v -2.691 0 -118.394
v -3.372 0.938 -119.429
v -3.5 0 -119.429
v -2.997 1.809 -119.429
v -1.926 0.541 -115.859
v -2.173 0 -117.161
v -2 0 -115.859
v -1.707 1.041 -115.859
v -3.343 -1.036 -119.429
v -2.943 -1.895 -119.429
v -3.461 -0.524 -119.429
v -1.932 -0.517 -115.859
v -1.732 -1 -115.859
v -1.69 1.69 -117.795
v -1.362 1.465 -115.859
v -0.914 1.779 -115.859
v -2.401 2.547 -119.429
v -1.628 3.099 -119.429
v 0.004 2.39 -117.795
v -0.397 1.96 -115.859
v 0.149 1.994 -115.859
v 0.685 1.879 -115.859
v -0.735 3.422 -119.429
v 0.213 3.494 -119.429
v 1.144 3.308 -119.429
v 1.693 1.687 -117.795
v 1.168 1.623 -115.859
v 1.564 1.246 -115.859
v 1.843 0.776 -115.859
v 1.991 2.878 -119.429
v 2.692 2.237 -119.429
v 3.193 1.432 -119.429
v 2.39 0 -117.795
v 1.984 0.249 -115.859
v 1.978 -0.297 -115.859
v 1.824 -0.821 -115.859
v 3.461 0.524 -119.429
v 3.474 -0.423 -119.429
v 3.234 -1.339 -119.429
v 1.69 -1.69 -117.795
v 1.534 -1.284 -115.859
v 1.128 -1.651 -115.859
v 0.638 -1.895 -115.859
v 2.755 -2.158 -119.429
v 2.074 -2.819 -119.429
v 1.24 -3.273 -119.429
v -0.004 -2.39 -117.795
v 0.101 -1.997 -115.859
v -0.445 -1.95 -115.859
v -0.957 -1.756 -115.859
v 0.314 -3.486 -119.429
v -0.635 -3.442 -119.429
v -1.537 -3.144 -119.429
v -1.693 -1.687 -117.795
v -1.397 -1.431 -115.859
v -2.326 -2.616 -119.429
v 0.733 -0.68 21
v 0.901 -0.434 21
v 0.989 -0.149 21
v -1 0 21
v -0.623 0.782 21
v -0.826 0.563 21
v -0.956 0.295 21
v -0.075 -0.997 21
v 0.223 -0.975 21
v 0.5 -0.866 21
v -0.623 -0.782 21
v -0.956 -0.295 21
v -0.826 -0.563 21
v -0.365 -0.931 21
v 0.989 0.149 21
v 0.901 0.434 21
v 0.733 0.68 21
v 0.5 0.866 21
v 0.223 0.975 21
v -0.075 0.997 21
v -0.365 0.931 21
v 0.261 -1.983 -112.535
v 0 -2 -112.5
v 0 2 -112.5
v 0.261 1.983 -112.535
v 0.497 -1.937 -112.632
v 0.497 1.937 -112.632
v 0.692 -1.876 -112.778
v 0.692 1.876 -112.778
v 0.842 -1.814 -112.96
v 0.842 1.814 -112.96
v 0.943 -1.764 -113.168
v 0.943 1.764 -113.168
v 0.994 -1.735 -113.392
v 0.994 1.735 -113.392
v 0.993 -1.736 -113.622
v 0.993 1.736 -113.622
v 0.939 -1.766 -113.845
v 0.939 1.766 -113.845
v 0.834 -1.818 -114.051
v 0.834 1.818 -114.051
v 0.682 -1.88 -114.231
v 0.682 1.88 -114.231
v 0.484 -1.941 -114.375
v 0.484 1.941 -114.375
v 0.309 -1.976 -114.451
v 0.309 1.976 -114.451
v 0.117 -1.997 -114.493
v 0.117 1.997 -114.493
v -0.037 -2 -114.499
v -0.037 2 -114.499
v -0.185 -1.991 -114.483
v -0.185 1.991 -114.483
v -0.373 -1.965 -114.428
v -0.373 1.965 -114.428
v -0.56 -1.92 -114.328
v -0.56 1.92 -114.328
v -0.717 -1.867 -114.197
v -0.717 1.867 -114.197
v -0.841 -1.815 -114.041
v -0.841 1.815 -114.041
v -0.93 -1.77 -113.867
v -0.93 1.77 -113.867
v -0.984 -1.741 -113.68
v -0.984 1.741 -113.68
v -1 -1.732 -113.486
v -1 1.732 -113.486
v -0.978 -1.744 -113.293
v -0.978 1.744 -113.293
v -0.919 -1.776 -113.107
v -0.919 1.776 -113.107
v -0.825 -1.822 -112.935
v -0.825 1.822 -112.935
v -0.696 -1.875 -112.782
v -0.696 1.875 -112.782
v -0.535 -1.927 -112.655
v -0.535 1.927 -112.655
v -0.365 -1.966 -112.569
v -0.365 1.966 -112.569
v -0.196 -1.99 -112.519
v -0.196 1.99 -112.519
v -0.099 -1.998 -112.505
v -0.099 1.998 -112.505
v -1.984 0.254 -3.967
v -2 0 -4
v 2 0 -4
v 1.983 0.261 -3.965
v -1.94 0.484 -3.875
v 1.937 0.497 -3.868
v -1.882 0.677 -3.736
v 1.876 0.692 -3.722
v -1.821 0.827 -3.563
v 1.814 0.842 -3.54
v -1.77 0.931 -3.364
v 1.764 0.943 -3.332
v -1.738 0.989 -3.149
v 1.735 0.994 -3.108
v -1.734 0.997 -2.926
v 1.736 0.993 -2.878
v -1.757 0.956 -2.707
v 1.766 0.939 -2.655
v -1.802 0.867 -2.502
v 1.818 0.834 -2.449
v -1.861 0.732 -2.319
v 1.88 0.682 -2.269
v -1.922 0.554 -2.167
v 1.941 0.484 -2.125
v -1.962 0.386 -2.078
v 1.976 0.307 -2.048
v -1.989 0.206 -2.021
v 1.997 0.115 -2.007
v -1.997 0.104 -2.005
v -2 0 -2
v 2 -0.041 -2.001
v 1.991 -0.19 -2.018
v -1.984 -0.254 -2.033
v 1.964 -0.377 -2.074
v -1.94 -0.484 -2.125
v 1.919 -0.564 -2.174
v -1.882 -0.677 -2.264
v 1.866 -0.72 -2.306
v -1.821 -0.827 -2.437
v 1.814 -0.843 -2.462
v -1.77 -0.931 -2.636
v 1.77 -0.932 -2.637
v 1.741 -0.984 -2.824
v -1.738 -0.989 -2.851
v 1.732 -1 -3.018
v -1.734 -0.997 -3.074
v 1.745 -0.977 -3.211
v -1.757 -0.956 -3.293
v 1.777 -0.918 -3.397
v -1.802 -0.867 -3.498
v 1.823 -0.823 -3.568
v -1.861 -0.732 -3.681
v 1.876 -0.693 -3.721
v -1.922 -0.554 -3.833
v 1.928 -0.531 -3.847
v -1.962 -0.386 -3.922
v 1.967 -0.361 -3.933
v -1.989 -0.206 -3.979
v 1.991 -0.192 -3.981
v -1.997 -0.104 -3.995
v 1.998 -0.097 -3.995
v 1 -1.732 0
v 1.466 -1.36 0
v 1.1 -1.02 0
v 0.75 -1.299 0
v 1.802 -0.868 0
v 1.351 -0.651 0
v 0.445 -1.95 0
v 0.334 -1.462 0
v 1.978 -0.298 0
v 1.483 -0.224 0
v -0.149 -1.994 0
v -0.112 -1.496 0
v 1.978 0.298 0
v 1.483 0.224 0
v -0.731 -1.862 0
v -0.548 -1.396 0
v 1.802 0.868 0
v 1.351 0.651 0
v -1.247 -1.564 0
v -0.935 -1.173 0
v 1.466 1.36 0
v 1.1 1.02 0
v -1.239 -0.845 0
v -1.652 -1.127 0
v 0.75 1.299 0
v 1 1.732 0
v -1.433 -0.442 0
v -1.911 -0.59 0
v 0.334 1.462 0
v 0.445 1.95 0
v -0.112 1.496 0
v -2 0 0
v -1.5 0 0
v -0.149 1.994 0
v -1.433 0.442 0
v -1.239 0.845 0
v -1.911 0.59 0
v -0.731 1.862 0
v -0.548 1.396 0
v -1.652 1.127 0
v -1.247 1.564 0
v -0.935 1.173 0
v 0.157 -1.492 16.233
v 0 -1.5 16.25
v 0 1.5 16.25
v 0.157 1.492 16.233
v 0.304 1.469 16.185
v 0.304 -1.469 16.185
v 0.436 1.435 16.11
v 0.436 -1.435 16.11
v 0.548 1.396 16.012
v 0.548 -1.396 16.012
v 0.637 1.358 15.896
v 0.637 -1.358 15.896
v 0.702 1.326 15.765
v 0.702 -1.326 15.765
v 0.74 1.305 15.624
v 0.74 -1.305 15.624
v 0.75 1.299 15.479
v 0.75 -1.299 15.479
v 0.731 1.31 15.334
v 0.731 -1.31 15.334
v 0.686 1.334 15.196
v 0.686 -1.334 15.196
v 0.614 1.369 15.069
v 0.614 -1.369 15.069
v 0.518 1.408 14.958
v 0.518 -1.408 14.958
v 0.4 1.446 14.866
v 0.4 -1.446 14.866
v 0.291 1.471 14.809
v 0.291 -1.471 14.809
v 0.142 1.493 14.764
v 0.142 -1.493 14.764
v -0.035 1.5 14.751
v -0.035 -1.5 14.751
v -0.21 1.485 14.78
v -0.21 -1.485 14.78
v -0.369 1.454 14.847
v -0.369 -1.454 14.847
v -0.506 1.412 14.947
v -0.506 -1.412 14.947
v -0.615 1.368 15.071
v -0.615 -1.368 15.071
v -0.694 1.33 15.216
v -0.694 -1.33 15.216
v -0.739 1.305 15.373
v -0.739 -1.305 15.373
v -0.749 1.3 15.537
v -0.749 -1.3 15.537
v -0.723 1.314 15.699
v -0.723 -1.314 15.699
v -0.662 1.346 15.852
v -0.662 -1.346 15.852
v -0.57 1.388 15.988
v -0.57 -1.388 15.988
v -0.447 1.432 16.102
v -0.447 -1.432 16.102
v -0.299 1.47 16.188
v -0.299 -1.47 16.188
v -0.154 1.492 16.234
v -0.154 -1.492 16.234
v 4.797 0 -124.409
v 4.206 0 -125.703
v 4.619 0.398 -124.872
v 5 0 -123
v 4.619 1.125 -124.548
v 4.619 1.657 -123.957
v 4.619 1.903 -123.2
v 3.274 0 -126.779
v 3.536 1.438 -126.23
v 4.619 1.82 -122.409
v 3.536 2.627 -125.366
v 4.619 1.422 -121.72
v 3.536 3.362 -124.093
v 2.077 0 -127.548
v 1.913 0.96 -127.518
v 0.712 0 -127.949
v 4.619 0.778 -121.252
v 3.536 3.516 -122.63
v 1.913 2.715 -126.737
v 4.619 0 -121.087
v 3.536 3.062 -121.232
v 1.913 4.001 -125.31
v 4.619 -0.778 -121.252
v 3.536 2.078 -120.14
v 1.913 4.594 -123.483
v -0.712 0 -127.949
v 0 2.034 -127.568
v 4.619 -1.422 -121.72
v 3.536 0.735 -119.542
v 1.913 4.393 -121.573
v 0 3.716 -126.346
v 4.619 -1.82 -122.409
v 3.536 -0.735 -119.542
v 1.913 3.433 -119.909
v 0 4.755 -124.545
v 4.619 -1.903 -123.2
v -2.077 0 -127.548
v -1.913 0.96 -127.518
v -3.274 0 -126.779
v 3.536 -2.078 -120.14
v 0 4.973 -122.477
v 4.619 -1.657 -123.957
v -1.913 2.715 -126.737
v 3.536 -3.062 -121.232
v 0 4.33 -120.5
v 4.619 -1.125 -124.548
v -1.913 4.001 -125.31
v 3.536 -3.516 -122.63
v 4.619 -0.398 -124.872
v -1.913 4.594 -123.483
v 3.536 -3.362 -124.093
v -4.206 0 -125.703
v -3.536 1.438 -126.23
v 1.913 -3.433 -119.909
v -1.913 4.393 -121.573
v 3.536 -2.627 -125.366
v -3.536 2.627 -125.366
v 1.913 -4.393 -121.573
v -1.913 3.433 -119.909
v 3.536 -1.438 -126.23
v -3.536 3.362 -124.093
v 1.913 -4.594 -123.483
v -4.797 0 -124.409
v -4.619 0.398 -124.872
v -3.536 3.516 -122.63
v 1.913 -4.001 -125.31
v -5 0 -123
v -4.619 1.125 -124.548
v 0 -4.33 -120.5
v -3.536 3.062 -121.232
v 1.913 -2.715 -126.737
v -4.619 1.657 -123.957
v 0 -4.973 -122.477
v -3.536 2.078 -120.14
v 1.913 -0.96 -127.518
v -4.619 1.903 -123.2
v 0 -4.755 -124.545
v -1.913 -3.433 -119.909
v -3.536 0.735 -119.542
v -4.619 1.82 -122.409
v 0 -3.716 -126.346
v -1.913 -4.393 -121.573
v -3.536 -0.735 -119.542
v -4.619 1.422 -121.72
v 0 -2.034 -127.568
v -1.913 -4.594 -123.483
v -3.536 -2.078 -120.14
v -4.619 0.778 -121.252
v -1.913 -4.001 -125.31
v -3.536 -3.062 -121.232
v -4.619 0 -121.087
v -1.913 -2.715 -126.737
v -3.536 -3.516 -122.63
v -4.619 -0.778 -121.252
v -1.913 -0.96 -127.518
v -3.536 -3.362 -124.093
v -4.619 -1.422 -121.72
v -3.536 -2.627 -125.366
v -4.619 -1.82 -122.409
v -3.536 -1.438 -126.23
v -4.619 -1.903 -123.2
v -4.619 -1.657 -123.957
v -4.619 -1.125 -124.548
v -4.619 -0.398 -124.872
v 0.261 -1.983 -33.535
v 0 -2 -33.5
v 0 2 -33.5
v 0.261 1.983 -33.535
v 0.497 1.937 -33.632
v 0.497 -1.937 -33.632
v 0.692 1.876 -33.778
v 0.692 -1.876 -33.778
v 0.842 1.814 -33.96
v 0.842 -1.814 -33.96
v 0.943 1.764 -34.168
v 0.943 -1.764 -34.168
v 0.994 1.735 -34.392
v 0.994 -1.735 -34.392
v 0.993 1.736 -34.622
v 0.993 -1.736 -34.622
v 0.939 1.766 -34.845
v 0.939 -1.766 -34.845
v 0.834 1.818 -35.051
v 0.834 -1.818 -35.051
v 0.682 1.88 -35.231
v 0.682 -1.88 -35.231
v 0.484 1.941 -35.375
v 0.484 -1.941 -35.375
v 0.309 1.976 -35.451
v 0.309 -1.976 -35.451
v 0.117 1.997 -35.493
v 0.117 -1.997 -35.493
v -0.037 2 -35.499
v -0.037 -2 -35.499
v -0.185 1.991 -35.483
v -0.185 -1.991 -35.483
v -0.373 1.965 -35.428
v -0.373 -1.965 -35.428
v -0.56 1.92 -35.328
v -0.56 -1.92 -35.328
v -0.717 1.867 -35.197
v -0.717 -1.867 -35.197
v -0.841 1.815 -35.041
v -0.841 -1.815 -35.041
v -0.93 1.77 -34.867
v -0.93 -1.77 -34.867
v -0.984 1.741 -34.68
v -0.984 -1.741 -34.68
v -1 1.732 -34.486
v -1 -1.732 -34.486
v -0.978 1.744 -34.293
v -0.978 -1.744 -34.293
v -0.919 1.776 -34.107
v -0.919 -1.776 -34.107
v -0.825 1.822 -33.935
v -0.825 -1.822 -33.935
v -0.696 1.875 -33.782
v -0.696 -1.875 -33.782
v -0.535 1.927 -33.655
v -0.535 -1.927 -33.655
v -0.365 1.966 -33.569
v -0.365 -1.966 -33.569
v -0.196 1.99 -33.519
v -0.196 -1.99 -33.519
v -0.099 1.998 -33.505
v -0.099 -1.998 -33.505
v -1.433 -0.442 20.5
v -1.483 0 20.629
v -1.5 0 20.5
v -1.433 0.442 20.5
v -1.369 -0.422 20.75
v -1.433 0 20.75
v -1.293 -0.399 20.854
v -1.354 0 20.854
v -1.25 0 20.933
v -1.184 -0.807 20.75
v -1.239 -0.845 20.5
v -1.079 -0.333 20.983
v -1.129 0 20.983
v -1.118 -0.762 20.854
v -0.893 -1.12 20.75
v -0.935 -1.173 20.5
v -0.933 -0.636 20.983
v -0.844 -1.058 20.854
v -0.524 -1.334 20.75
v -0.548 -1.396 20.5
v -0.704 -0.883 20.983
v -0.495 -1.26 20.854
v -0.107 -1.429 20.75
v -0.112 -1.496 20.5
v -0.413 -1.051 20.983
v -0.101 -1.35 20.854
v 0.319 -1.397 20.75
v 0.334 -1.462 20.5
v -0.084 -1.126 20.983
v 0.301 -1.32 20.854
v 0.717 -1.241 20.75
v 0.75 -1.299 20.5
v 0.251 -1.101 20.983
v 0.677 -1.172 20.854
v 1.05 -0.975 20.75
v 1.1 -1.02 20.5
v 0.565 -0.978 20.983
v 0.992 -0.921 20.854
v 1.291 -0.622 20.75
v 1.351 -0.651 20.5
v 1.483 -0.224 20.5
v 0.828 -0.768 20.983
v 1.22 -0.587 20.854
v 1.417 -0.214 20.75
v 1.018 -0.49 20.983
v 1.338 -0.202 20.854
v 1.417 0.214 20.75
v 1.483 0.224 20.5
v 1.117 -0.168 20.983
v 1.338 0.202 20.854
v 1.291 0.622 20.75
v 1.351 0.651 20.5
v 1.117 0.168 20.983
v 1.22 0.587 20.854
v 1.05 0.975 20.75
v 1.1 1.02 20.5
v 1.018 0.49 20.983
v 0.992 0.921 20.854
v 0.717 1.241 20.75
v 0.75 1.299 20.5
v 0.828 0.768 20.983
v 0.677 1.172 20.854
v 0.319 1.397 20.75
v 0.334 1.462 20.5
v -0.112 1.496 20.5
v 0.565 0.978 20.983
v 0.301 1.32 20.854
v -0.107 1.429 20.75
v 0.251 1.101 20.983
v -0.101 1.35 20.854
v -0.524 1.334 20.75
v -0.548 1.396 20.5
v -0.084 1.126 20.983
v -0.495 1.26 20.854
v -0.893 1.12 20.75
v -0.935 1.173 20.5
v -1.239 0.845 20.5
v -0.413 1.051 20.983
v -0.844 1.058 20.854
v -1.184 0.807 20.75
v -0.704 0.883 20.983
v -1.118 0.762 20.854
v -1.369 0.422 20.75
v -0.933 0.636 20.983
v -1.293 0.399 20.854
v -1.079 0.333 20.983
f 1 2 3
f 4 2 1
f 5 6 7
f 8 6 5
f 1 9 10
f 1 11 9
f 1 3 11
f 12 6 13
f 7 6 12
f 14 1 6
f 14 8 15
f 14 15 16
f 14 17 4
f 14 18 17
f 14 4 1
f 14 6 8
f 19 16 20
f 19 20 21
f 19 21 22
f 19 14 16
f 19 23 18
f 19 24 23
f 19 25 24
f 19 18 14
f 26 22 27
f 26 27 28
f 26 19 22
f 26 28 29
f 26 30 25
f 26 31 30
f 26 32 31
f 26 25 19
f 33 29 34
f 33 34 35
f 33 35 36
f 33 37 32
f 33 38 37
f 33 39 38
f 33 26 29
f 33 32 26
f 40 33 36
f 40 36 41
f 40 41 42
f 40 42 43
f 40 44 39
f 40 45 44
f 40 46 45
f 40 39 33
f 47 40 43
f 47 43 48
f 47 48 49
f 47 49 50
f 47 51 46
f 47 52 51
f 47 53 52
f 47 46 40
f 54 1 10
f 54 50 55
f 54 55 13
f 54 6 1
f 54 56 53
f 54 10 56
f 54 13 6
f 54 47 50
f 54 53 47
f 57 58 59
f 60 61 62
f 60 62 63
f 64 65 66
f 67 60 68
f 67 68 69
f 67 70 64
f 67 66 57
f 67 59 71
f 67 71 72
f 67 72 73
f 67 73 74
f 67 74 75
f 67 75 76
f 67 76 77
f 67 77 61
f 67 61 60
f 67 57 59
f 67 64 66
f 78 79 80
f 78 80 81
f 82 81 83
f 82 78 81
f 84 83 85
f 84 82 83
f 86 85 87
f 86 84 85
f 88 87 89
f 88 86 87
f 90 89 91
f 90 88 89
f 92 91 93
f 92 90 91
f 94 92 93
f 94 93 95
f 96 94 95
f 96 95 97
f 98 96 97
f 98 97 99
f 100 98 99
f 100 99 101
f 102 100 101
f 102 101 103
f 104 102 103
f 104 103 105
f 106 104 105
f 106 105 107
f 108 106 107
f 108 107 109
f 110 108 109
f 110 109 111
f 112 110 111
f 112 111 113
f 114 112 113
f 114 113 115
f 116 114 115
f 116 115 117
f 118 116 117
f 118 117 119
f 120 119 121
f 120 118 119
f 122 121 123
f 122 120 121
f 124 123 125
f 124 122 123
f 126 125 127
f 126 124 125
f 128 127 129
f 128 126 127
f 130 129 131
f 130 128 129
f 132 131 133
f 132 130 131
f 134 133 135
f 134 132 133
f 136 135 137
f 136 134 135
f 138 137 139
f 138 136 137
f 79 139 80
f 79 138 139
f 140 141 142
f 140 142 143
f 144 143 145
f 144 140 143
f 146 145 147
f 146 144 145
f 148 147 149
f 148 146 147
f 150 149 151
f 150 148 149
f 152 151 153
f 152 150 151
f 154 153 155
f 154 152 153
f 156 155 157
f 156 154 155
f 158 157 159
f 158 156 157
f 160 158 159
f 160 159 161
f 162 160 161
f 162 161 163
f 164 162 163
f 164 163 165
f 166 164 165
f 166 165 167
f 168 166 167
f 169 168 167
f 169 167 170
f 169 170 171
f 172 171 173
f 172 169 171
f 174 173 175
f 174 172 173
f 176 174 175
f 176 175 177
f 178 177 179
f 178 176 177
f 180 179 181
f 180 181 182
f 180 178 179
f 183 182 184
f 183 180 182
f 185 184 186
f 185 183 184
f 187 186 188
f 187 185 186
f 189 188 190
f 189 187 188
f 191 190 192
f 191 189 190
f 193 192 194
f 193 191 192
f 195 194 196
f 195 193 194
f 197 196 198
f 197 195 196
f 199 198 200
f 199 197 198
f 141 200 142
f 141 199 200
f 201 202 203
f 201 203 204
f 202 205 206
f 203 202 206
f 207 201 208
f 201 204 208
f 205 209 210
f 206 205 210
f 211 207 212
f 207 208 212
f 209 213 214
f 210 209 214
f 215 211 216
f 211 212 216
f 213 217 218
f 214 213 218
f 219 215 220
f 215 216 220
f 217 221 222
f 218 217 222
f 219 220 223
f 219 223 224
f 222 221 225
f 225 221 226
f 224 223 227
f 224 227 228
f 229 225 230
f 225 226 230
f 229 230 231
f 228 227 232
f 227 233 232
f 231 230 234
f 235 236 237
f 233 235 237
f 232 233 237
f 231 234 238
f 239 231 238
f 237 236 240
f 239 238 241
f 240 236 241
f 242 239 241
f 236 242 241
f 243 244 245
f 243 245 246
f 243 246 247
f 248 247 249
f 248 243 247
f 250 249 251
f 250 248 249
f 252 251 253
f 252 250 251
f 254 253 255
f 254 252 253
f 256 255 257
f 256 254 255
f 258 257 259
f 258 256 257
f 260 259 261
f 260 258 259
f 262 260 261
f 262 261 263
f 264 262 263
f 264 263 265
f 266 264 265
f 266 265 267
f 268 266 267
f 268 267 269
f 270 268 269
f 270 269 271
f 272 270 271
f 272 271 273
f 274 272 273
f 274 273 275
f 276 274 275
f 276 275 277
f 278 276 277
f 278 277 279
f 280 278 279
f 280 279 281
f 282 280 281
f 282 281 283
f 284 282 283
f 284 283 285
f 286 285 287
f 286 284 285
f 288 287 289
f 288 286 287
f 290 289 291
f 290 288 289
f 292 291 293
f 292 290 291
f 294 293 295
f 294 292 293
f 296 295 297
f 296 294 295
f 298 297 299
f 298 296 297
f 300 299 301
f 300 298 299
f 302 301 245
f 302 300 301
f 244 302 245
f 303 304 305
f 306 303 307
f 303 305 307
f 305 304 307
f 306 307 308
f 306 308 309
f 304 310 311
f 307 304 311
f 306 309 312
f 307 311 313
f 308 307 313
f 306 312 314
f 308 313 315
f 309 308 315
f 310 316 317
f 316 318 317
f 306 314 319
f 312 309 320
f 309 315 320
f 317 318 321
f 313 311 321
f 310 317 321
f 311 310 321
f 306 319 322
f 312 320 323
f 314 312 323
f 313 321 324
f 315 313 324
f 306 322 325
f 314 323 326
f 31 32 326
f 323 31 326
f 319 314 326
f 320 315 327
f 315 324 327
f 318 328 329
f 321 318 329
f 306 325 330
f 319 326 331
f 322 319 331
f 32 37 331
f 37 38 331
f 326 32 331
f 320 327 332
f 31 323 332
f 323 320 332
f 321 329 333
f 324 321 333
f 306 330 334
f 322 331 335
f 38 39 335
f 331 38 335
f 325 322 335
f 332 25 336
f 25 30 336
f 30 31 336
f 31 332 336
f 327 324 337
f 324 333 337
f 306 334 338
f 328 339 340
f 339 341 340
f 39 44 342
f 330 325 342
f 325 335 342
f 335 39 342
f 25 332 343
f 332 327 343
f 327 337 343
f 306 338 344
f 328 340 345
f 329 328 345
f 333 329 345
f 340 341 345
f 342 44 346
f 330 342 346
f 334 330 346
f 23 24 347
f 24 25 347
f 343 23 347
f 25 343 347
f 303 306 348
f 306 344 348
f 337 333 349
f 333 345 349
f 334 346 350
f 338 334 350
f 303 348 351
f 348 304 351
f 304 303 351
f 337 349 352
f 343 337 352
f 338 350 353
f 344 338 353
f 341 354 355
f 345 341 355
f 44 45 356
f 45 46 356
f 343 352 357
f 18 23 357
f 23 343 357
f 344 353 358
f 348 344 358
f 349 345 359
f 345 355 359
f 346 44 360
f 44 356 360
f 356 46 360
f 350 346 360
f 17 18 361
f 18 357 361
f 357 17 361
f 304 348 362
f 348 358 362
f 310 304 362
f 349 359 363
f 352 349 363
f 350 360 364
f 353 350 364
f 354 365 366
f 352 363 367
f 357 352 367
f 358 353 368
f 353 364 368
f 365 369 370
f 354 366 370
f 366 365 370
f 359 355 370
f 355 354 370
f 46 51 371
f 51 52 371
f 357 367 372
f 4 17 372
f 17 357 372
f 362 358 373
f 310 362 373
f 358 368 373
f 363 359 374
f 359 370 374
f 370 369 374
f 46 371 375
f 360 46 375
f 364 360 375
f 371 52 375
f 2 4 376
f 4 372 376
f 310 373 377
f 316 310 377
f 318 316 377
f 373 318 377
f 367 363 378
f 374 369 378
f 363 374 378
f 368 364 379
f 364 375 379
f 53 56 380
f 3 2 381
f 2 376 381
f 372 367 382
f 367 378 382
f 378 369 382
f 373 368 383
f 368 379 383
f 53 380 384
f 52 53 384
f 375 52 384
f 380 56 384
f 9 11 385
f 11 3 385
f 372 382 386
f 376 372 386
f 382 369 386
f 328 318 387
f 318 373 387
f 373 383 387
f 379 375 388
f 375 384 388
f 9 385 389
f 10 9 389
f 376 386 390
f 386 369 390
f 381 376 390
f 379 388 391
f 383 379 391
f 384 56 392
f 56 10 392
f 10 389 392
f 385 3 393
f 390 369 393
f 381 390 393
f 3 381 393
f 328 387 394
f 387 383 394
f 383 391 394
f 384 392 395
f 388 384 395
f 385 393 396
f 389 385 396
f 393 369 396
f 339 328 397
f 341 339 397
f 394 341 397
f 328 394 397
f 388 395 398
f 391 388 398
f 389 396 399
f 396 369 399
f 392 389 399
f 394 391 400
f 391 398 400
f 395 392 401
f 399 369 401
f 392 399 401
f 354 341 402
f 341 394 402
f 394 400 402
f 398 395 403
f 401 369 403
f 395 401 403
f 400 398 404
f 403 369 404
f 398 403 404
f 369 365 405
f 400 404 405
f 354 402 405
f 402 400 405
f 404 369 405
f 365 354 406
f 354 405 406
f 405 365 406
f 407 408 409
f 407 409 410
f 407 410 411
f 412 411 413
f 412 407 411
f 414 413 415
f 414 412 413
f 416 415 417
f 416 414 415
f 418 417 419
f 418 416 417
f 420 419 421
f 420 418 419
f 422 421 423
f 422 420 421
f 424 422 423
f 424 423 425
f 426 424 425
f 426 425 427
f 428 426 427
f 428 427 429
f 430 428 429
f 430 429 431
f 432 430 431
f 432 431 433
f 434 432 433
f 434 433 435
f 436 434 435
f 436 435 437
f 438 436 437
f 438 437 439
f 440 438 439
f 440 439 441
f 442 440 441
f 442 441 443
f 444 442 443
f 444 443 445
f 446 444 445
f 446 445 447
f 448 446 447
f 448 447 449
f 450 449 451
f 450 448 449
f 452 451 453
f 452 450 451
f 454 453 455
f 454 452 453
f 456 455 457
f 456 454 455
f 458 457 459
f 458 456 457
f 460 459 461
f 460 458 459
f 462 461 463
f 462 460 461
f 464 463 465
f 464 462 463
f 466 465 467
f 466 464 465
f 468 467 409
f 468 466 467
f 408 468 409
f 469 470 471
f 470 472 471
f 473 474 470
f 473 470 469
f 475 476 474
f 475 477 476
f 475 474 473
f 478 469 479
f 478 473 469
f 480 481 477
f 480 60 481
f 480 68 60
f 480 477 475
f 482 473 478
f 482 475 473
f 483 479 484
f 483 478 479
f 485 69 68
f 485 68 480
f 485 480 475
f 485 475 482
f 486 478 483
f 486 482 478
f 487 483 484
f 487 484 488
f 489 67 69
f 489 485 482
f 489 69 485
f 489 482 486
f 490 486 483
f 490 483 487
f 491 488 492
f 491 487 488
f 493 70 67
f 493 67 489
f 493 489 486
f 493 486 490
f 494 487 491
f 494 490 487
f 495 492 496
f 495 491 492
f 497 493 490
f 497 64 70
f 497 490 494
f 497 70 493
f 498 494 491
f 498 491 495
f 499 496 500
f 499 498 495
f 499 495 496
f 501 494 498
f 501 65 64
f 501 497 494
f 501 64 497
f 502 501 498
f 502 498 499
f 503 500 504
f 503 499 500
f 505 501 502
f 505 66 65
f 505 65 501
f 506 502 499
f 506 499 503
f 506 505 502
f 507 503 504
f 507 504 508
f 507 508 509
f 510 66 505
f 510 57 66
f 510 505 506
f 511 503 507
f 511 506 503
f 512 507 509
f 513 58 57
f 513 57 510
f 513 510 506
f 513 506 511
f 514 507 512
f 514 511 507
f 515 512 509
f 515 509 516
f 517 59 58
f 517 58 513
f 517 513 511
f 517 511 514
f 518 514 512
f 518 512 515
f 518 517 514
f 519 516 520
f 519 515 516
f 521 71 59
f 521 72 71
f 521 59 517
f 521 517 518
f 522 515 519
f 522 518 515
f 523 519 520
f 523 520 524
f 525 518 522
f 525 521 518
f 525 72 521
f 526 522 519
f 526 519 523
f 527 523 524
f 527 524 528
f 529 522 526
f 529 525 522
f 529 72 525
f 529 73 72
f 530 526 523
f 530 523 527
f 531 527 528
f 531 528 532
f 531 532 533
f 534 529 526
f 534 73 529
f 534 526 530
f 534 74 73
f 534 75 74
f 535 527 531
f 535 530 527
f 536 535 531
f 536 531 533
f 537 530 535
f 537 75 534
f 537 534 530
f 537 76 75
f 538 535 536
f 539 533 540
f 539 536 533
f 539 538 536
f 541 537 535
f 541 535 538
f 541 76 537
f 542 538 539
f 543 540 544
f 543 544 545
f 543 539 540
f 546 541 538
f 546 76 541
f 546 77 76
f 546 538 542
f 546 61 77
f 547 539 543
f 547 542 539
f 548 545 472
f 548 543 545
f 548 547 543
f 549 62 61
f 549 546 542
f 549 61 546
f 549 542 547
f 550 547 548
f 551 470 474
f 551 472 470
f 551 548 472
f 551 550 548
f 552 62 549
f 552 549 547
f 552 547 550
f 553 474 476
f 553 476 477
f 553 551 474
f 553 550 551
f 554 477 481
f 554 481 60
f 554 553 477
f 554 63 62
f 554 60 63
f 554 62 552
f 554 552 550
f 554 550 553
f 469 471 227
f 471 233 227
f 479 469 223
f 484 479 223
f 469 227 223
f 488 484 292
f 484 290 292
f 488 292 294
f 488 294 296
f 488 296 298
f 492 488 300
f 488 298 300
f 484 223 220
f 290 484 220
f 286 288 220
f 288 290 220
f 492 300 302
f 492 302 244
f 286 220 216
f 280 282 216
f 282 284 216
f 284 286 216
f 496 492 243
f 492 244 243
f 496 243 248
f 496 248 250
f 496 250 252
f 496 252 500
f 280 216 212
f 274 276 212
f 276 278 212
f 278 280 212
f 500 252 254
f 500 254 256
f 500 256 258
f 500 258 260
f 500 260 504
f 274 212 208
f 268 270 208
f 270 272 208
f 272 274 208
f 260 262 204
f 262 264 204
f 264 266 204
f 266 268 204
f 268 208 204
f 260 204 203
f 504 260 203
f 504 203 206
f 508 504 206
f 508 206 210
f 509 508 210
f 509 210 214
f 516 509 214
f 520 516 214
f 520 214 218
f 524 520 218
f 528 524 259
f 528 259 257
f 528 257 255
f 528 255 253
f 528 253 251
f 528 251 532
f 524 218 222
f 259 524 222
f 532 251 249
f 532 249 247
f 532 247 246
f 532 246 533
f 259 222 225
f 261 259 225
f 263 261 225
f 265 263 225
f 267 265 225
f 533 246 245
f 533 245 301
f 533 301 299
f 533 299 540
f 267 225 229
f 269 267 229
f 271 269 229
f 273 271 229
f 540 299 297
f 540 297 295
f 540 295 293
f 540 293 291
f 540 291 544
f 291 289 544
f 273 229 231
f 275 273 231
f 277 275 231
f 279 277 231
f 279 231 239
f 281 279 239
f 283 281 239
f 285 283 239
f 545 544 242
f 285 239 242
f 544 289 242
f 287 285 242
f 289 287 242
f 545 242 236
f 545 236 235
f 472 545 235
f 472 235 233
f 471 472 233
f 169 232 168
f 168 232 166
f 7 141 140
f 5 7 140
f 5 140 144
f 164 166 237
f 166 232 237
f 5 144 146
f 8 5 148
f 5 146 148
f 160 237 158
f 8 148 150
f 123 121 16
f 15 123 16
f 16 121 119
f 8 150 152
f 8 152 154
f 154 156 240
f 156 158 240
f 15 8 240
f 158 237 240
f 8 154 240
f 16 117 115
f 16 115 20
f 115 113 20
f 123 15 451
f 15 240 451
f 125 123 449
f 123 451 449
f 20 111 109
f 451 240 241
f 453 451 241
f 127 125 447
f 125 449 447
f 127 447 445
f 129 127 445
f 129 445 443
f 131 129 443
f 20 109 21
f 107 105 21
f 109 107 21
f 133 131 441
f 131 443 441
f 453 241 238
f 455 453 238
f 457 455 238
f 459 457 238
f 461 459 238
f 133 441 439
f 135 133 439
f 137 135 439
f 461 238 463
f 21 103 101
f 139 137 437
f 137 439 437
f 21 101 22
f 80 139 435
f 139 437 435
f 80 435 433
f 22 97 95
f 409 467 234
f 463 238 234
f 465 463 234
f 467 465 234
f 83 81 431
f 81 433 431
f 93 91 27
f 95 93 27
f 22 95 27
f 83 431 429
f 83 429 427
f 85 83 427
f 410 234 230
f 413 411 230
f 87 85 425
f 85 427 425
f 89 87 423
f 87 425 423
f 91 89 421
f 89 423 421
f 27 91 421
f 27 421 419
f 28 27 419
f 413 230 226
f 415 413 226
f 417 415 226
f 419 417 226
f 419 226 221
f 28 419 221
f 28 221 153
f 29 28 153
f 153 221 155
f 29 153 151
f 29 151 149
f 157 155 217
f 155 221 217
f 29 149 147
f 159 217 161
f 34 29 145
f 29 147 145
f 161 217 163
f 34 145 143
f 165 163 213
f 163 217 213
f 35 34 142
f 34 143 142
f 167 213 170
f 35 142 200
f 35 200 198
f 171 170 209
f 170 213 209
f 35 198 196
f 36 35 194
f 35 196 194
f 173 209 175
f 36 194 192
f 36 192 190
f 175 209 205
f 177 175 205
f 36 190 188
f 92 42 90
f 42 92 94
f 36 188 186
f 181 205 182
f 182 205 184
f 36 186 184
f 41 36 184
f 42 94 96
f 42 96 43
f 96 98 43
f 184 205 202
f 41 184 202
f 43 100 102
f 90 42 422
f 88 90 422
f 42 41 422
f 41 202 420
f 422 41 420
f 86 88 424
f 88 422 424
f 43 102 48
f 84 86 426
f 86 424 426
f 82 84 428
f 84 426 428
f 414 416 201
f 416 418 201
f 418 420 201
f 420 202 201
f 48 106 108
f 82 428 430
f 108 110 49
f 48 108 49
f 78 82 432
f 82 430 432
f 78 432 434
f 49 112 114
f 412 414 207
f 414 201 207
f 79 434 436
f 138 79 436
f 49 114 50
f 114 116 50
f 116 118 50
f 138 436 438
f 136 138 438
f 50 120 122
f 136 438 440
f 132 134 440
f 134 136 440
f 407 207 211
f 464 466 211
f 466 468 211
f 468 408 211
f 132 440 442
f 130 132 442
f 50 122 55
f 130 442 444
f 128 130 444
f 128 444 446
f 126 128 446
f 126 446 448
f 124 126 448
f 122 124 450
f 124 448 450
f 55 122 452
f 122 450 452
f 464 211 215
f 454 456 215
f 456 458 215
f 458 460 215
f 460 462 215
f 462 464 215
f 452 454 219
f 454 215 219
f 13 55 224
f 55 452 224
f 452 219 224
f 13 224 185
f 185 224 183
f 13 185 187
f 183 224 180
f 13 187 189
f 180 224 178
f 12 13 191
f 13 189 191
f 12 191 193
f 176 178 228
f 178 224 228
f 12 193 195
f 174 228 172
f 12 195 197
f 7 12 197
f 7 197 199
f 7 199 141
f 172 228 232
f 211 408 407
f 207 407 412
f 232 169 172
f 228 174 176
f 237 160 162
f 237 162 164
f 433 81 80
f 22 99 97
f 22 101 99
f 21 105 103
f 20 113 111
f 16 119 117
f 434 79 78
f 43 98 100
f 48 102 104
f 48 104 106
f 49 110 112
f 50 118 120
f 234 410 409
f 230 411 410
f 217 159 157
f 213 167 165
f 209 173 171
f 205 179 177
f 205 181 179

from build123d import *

# Parameters (mm, degrees)
SKETCH1_R               = 1.5
BOSS_EXTRUDE1_DEPTH     = 21
SKETCH2_R               = 2
BOSS_EXTRUDE2_DEPTH     = 123
FILLET1_R               = 5
FILLET2_R               = 0.5
CUT_EXTRUDE1_DEPTH      = 129.195163715
CUT_EXTRUDE1_DEPTH_BACK = 129.195163715
SKETCH4_R               = 0.75
SKETCH4_R_2             = 1
CUT_EXTRUDE2_DEPTH      = 129.195163715
CUT_EXTRUDE2_DEPTH_BACK = 129.195163715
SKETCH5_R               = 1


with BuildPart() as part:
    # Sketch1 → Boss-Extrude1 (new body)
    with BuildSketch(Plane.XY):
        with Locations(Location((0, 0, 0), (0, 0, 180))):
            Circle(SKETCH1_R)
    extrude(amount=BOSS_EXTRUDE1_DEPTH)

    # Sketch2 → Boss-Extrude2 (add)
    with BuildSketch(Plane(origin=(0, 0, 0), x_dir=(-1, 0, 0), z_dir=(0, 0, -1))):
        Circle(SKETCH2_R)
    extrude(amount=BOSS_EXTRUDE2_DEPTH)

    # Sketch3 → Revolve1 (revolve)
    with BuildSketch(Plane(origin=(0, 0, 0), x_dir=(1, 0, 0), z_dir=(0, 1, 0))):
        with BuildLine():
            Line((-5, 123), (5, 123))
            ThreePointArc((5, 123), (0, 128), (-5, 123))
        make_face()
    revolve(axis=Axis((-5, 0, -123), (1, 0, 0)))

    # Fillet1
    fillet1_edges = [part.edges().sort_by_distance(p)[0] for p in [
        (2, 0, -118.417424305),
    ]]
    fillet(fillet1_edges, radius=FILLET1_R)

    # Fillet2
    fillet2_edges = [part.edges().sort_by_distance(p)[0] for p in [
        (1.5, 0, 21),
    ]]
    fillet(fillet2_edges, radius=FILLET2_R)

    # Sketch4 → Cut-Extrude1 (cut, two sides: drawn at the far end of the back side and taken through both)
    with BuildSketch(Plane(origin=(0, 0, 0), x_dir=(1, 0, 0), z_dir=(0, 1, 0)).offset(-CUT_EXTRUDE1_DEPTH_BACK)):
        with Locations(Location((0, -15.5, 0), (0, 0, 270))):
            Circle(SKETCH4_R)
        with Locations(Location((0, 34.5, 0), (0, 0, 270))):
            Circle(SKETCH4_R_2)
        with Locations(Location((0, 113.5, 0), (0, 0, 270))):
            Circle(SKETCH4_R_2)
    extrude(amount=CUT_EXTRUDE1_DEPTH + CUT_EXTRUDE1_DEPTH_BACK, mode=Mode.SUBTRACT)

    # Sketch5 → Cut-Extrude2 (cut, two sides: drawn at the far end of the back side and taken through both)
    with BuildSketch(Plane(origin=(0, 0, 0), x_dir=(0, 0, -1), z_dir=(1, 0, 0)).offset(-CUT_EXTRUDE2_DEPTH_BACK)):
        with Locations((3, 0)):
            Circle(SKETCH5_R)
    extrude(amount=CUT_EXTRUDE2_DEPTH + CUT_EXTRUDE2_DEPTH_BACK, mode=Mode.SUBTRACT)


solid = part.part
